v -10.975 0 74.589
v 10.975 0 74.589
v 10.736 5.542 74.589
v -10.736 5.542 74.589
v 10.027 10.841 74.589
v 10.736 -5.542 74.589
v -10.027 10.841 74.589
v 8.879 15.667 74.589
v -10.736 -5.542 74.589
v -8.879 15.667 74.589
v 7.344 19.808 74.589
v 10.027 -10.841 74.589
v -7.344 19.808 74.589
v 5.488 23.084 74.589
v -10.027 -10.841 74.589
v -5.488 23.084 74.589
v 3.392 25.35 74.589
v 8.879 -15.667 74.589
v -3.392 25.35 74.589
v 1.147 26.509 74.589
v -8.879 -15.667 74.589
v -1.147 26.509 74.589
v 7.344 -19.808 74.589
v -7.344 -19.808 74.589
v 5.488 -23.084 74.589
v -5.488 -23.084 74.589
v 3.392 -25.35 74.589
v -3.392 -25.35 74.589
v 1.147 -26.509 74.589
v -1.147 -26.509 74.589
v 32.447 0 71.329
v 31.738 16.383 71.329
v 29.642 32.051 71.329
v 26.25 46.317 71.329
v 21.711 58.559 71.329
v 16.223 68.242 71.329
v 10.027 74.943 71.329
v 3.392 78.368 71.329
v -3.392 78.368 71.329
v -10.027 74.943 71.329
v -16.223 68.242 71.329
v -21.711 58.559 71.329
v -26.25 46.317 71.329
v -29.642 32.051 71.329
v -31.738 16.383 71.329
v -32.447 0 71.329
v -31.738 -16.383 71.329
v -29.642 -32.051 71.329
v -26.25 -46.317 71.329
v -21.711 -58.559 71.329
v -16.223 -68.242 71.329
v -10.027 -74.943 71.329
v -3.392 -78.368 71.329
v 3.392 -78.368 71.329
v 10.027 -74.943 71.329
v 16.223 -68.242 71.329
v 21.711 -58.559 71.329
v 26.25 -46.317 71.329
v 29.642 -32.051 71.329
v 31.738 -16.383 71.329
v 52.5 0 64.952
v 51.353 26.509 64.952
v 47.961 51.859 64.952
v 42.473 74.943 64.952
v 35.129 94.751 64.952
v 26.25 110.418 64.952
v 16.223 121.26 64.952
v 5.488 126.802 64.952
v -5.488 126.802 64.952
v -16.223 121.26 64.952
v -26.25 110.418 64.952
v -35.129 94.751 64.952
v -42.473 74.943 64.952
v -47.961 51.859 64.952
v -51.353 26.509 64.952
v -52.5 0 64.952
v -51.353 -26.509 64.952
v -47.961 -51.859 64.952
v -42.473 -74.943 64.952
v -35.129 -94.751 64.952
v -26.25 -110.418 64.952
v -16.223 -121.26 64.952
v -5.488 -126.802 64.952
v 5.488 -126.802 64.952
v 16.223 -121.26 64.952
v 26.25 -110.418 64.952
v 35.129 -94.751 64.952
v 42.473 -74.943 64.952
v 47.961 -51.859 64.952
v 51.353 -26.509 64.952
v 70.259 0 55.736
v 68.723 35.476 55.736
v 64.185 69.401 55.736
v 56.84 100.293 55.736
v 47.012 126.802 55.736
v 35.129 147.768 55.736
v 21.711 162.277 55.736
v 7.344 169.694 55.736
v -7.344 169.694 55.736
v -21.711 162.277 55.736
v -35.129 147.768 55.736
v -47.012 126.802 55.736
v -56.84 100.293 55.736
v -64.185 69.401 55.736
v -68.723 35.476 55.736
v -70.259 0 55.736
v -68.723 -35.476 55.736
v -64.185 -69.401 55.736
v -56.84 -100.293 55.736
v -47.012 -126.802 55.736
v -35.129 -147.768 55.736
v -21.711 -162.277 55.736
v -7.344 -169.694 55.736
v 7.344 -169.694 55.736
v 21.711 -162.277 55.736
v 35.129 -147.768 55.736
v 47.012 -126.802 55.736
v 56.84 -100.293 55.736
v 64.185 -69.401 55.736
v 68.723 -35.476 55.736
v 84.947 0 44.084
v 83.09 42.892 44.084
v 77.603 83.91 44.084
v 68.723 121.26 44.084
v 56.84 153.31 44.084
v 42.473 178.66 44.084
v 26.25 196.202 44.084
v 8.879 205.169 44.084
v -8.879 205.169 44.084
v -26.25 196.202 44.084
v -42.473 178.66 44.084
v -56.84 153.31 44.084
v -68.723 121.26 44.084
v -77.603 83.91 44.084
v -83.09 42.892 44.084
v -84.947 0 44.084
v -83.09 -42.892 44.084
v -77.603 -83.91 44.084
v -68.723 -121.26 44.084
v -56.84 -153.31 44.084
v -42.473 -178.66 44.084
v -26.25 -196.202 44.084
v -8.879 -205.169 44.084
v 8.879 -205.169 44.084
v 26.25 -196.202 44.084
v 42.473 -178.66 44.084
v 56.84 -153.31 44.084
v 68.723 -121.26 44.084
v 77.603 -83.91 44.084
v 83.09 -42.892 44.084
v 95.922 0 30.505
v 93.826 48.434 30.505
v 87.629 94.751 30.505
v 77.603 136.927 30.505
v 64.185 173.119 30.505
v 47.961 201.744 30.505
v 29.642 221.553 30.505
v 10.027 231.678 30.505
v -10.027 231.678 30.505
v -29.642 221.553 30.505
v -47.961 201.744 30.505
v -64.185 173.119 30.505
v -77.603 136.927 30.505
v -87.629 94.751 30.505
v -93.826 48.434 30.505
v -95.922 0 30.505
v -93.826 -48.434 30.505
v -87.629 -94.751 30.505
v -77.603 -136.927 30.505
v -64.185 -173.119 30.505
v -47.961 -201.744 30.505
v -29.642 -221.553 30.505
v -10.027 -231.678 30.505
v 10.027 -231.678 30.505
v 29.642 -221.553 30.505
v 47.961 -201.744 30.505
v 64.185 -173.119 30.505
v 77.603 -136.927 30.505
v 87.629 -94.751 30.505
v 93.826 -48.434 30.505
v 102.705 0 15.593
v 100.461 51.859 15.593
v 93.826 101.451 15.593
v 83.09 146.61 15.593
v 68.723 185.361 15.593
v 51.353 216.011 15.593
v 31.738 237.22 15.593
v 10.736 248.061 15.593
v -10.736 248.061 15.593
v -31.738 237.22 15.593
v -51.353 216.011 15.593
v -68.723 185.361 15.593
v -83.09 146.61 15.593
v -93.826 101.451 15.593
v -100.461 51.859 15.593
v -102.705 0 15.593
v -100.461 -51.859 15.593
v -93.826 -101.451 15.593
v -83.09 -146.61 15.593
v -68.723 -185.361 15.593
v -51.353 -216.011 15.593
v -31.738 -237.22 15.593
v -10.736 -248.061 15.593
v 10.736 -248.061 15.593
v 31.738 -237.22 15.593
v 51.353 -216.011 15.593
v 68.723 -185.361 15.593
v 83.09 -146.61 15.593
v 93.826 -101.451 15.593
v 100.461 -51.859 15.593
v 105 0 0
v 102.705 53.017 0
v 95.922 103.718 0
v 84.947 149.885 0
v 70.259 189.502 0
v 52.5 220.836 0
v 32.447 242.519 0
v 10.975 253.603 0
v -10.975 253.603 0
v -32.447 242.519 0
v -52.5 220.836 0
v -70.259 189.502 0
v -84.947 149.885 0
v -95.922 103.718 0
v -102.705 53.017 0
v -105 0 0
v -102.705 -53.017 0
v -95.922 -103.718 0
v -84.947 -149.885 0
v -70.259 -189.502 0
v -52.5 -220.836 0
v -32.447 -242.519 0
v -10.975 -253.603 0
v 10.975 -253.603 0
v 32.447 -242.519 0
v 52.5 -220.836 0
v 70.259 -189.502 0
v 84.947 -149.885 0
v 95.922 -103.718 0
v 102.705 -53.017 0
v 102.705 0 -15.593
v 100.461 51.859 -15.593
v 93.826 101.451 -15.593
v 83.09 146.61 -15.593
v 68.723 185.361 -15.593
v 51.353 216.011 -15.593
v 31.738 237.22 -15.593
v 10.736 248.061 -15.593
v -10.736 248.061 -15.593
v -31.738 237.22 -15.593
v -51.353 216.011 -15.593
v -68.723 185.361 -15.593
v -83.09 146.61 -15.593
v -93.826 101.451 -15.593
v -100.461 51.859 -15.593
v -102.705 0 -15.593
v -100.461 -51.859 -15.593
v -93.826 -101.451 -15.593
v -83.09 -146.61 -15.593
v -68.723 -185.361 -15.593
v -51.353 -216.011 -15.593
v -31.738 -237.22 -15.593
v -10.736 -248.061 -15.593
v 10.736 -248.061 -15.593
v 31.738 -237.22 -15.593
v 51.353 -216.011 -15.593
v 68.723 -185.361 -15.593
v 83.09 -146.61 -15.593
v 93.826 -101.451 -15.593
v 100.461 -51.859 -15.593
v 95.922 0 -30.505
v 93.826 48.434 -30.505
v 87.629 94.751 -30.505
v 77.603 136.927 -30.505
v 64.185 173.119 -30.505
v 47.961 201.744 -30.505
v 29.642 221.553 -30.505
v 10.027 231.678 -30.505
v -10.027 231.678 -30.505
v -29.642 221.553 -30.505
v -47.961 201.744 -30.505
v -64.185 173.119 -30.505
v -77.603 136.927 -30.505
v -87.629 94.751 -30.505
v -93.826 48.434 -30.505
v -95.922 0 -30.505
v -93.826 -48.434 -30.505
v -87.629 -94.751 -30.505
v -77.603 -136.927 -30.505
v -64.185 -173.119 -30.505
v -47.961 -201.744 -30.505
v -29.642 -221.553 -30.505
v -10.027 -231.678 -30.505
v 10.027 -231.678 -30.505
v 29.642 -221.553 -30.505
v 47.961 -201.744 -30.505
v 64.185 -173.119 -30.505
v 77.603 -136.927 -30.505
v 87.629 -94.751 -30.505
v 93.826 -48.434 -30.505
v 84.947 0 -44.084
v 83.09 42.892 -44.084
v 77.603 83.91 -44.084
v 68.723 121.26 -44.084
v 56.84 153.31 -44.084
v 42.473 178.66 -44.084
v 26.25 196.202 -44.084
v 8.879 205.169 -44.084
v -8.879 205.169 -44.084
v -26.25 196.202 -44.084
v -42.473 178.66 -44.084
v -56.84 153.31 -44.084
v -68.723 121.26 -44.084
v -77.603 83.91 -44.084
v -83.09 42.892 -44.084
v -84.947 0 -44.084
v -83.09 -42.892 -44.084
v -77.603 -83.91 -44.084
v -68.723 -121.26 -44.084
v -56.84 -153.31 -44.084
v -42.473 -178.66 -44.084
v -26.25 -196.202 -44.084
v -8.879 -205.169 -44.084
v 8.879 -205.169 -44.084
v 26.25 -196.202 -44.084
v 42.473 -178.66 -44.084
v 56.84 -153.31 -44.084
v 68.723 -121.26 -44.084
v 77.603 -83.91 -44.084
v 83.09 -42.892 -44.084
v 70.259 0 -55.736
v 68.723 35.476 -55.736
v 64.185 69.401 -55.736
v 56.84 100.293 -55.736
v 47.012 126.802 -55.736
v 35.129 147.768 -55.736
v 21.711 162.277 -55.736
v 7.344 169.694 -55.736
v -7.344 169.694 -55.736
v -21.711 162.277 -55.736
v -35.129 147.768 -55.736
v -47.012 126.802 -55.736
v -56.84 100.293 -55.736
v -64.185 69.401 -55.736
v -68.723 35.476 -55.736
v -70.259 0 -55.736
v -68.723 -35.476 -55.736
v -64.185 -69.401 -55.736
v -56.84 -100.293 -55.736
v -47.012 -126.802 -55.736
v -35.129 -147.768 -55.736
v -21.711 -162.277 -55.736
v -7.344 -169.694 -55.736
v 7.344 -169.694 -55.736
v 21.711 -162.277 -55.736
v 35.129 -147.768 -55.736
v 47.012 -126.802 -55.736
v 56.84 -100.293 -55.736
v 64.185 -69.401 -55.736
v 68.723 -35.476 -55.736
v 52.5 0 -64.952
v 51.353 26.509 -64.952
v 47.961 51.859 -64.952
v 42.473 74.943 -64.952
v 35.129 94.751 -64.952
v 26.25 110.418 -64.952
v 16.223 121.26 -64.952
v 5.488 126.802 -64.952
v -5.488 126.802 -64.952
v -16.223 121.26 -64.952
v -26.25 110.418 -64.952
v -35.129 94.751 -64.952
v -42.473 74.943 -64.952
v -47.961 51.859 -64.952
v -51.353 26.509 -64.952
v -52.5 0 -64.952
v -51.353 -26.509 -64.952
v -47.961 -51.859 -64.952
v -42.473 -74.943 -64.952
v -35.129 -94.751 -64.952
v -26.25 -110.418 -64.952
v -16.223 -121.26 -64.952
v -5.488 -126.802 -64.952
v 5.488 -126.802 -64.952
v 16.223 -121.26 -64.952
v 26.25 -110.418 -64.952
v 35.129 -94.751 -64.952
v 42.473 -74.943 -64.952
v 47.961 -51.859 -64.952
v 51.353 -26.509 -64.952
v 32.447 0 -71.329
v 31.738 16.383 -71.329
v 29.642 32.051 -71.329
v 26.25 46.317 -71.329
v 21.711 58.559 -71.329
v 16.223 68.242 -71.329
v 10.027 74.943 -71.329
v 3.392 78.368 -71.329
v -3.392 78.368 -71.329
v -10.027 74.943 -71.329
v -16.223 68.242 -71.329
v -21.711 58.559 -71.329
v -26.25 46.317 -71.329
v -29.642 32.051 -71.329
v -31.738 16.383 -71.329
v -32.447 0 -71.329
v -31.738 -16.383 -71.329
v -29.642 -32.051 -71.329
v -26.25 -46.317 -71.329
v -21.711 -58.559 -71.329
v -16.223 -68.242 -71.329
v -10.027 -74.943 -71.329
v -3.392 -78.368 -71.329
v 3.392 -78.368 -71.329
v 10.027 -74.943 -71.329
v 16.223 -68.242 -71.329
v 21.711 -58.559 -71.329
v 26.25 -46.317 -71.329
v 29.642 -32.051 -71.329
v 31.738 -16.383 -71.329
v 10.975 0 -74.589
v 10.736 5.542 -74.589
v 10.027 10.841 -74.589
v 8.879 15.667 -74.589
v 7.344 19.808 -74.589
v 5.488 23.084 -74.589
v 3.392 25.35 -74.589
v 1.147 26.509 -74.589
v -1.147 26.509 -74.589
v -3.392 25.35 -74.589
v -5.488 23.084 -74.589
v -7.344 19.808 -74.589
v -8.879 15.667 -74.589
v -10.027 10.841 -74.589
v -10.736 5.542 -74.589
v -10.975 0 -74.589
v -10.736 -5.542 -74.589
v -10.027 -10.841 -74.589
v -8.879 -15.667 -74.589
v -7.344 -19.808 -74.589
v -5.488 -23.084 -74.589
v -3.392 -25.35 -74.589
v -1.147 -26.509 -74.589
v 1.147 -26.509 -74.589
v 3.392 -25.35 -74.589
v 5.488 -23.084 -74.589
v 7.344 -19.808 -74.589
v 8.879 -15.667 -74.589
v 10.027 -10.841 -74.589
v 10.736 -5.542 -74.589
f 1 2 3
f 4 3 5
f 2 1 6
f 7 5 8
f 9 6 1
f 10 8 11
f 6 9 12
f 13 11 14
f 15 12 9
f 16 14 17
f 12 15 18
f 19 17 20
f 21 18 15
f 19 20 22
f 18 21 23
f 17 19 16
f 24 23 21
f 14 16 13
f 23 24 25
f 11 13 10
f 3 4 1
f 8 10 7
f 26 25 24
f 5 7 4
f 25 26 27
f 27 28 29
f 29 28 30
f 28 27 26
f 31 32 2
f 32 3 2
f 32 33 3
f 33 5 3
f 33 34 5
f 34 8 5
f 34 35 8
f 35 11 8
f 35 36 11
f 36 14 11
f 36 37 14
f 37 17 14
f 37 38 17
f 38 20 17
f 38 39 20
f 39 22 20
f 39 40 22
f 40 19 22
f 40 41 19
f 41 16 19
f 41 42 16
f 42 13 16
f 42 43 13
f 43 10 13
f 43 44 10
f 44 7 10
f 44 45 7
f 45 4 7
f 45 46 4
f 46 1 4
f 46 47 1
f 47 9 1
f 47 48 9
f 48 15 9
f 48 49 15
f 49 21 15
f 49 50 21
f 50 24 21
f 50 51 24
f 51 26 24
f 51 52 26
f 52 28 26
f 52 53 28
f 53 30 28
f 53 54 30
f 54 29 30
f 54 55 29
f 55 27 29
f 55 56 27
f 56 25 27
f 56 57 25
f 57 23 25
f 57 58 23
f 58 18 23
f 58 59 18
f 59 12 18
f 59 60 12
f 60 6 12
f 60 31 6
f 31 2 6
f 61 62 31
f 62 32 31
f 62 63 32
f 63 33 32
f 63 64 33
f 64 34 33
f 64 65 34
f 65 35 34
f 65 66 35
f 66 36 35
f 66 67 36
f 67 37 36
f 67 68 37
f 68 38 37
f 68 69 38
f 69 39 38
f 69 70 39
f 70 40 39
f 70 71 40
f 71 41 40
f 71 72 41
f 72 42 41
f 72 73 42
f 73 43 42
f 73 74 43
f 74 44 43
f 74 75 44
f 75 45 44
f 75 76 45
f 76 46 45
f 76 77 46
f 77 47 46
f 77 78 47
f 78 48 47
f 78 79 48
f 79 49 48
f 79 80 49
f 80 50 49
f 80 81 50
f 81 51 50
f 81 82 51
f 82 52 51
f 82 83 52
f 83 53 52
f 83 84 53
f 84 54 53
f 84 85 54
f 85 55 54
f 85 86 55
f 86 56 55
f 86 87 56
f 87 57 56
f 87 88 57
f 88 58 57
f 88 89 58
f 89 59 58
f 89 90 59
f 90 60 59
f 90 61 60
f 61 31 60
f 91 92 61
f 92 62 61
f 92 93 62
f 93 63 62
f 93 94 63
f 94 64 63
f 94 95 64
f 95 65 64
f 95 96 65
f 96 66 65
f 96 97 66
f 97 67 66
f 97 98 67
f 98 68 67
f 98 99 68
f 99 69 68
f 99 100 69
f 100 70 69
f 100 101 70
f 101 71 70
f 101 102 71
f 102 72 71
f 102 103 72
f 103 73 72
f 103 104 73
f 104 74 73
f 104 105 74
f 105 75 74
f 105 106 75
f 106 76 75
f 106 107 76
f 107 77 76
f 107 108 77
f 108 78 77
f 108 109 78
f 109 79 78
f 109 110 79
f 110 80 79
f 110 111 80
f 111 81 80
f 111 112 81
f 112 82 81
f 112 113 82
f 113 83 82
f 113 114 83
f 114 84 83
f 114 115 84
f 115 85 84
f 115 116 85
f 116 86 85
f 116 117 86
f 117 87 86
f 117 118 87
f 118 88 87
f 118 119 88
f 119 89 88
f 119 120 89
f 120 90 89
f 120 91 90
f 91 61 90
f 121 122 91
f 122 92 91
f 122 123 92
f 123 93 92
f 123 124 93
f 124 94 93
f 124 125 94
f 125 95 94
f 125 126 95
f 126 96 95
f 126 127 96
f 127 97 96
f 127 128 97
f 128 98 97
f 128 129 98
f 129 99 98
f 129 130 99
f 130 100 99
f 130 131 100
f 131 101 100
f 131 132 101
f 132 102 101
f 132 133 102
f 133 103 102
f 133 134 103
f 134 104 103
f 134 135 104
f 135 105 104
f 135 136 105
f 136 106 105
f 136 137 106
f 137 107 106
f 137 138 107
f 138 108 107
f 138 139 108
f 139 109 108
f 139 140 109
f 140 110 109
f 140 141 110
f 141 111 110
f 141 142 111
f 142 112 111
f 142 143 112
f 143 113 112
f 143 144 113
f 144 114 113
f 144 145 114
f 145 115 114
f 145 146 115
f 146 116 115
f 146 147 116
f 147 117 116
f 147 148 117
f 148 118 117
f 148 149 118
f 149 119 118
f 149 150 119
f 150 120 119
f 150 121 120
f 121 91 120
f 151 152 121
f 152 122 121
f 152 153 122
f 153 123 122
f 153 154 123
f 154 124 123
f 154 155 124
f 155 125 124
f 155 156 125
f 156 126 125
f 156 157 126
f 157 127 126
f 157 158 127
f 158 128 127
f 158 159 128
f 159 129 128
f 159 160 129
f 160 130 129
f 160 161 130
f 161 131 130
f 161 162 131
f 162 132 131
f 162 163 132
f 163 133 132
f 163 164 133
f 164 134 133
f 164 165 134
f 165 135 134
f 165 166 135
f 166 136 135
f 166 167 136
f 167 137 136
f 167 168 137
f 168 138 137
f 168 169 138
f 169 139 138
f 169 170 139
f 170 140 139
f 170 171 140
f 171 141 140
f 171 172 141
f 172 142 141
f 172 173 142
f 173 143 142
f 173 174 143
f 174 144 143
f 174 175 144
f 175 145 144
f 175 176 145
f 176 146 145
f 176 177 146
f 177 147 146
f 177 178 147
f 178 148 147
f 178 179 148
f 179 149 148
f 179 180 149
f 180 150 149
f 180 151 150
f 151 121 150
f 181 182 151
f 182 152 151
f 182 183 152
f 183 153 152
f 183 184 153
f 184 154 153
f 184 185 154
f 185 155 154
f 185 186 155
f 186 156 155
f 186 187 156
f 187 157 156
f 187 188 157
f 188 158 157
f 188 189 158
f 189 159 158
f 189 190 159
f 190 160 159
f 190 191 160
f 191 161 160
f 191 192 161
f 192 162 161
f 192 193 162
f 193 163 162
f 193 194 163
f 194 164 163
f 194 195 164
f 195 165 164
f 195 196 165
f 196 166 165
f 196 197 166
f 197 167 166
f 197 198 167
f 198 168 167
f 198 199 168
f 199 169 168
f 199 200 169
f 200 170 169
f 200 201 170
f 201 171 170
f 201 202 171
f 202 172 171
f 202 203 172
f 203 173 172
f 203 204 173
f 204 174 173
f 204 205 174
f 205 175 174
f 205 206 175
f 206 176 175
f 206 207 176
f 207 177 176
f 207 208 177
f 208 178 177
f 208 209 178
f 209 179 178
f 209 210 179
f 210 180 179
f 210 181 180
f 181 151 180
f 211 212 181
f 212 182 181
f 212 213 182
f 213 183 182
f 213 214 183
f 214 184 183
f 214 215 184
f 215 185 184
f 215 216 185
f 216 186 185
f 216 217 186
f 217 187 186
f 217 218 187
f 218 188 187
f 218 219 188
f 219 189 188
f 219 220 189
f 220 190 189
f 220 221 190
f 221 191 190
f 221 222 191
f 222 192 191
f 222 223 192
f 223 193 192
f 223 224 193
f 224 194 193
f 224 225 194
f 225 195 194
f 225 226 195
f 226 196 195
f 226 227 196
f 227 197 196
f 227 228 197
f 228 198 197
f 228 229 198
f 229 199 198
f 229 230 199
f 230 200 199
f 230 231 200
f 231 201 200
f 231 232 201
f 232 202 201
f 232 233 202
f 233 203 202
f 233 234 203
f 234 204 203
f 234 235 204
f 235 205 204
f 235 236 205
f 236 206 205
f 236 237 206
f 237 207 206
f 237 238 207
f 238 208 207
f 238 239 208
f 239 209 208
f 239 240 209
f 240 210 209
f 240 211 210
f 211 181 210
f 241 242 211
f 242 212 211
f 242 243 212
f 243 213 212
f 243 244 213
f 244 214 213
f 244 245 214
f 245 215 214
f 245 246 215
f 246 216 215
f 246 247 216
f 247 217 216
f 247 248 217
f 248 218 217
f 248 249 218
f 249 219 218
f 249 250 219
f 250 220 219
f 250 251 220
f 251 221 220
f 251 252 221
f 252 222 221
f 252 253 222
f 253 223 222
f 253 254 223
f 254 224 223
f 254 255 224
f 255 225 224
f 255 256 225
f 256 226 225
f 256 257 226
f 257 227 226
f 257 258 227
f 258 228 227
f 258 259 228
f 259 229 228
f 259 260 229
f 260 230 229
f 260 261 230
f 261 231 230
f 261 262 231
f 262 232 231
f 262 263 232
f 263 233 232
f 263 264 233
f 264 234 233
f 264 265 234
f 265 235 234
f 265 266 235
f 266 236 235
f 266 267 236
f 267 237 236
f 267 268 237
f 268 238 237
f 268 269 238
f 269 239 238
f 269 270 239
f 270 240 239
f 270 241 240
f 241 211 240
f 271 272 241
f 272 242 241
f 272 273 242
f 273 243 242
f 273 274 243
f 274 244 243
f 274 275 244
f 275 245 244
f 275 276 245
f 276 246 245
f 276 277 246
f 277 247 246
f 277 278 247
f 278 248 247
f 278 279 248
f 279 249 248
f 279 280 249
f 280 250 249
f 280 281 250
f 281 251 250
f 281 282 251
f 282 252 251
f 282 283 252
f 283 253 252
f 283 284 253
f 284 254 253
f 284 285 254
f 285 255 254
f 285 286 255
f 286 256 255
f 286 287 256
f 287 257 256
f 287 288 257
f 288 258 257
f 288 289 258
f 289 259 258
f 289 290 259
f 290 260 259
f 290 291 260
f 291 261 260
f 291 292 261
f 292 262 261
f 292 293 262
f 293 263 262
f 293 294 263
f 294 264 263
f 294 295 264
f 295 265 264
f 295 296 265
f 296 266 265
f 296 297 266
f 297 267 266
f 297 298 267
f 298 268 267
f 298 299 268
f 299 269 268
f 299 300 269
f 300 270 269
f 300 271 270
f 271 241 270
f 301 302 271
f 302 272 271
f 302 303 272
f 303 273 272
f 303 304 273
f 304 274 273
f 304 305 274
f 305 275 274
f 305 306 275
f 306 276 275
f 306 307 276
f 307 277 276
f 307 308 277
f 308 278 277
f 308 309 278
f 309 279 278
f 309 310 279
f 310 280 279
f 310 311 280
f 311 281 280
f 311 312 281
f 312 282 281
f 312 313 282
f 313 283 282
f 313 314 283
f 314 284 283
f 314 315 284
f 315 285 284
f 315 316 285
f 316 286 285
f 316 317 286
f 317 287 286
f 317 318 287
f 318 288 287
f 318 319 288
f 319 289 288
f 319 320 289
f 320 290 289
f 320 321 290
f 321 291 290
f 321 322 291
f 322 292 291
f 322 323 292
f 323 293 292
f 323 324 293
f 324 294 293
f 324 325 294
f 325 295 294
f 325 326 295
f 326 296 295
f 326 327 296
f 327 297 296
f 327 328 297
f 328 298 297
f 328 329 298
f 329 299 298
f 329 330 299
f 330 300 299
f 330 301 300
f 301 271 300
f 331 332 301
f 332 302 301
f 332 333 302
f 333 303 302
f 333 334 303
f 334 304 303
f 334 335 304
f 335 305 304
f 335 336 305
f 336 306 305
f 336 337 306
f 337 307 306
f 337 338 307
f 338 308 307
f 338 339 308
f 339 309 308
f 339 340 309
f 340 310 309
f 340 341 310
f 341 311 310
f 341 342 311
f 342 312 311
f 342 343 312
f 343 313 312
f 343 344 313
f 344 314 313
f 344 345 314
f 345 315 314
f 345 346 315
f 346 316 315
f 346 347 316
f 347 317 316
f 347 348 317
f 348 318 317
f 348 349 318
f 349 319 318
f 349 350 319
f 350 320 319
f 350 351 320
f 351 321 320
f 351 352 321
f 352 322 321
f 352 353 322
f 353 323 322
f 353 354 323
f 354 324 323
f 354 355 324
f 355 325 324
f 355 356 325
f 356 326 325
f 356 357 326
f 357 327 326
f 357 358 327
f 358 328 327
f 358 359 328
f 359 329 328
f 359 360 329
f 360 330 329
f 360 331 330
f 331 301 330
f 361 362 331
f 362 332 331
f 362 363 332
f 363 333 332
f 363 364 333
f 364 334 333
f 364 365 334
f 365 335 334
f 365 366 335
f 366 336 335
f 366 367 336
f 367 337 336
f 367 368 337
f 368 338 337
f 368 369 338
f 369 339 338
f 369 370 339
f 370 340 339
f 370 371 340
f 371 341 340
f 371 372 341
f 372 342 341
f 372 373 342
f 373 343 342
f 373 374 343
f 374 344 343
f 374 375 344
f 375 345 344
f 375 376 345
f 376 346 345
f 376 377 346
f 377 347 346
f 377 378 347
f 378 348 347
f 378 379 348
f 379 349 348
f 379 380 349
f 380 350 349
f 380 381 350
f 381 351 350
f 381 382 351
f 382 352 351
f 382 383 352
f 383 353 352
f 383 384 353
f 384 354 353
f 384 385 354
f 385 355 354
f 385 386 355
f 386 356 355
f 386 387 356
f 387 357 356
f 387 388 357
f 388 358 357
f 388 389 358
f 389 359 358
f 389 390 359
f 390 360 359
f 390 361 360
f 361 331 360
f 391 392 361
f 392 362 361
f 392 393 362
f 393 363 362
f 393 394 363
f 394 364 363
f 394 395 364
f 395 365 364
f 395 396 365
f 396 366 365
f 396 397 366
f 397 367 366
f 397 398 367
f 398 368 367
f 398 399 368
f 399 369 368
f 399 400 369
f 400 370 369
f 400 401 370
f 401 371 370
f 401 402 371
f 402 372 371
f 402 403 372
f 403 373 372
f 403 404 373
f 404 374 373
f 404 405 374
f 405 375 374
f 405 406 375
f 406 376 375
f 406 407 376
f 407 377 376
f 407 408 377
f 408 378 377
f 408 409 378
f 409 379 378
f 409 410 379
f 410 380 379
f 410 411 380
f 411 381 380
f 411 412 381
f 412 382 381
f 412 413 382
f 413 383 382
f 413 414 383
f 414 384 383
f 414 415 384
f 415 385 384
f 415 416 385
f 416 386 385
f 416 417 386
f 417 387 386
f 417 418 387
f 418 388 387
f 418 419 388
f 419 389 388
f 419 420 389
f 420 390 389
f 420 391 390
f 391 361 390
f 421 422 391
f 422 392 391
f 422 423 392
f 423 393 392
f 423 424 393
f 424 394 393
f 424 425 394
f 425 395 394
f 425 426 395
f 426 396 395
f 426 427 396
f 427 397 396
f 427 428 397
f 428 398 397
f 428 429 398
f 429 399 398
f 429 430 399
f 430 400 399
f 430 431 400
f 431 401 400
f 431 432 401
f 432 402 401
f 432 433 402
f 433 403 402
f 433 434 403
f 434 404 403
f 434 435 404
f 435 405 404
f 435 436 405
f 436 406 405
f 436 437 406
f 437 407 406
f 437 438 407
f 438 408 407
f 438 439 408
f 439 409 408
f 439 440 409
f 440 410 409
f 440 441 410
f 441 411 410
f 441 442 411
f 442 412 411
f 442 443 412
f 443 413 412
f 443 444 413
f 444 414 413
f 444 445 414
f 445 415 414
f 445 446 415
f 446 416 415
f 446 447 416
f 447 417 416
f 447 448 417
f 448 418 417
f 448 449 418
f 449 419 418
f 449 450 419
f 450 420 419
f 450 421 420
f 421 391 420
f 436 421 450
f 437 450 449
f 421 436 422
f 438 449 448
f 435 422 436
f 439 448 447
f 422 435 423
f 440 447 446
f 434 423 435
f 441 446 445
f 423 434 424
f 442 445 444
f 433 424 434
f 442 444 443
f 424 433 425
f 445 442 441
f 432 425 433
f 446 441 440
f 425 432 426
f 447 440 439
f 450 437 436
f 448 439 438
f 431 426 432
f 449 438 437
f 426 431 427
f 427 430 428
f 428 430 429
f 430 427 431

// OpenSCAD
// Generated by SolidPython 1.0.1 on 2020-07-29 00:46:48


scale(v = [7, 17, 5]) {
	sphere(r = 15);
}
/***********************************************
*********      SolidPython code:      **********
************************************************
 
# import packages: SolidPython
from solid import *
from solid.utils import *
from itertools import chain, combinations, permutations


class Resize:

    def __init__(self, scad_file):
        self.scad_file = scad_file
        #self.scad_file = import_scad(scad_file)
        # cone/cylinder param:
        self.r1 = 0
        self.r2 = 0
        self.h = 0
        # rectangular prism param:
        self.w = 0
        self.l = 0
        # ellipse param:
        self.r = 0

    # import OpenScad code (file name corresponds to shape)


    # classify shape + parameters
    def assign(self, param1, param2, param3):
        if self.scad_file == 'cone.scad':
            self.r1 = param1
            self.r2 = param2
            self.h = param3
        elif self.scad_file == 'cylinder.scad':
            self.r1 = param1
            self.r2 = param2
            self.h = param3
        elif self.scad_file == 'rectangularPrism.scad':
            self.h = param1
            self.l = param2
            self.w = param3
        else:
            self.r = param1
            self.h = param2

    # resize parameters
    def iterate(self):
        x = range(3, 20, 2)
        i = 1
        if self.scad_file == 'cone.scad':
            tempList = list(permutations(x, 2))
            for temp in tempList:
                param1 = temp[0]
                param2 = temp[1]
                filepath = 'produced_scad_files/' + 'cone' + str(param1) + '_' + str(param2) + '_' + '.scad'
                scad_render_to_file(cylinder(h=param1, r1=param2, r2=0), filepath)

        elif self.scad_file == 'cylinder.scad':
            tempList = list(permutations(x, 3))
            for temp in tempList:
                param1 = temp[0]
                param2 = temp[1]
                filepath = 'produced_scad_files/' + 'cylinder' + str(param1) + '_' + str(param2) + '_' + '.scad'
                scad_render_to_file(cylinder(h=param1, r1=param2, r2=param2), filepath)

        elif self.scad_file == 'rectangularPrism.scad':
            tempList = list(permutations(x, 3))
            for temp in tempList:
                param1 = temp[0]
                param2 = temp[1]
                param3 = temp[2]
                filepath = 'produced_scad_files/' + 'rectangularPrism' + str(param1) + '_' + str(param2) + '_' + str(
                    param3) + '.scad'
                scad_render_to_file(cube(size=(param1, param2, param3)), filepath)

        elif self.scad_file == 'ellipse.scad':
            tempList = list(permutations(x, 4))
            for temp in tempList:
                param1 = temp[0]
                param2 = temp[1]
                param3 = temp[2]
                param4 = temp[3]
                filepath = 'produced_scad_files/' + 'ellipse' + str(param1) + '_' + str(param2) + '_' + str(param3) + '_' + str(param4) + '.scad'
                scad_render_to_file(scale([param1, param2, param3])(sphere(r=param4)), filepath)

    def render_to_scadfile(self):
        scad_render_to_file(scad, 'example.scad') 
 
************************************************/
